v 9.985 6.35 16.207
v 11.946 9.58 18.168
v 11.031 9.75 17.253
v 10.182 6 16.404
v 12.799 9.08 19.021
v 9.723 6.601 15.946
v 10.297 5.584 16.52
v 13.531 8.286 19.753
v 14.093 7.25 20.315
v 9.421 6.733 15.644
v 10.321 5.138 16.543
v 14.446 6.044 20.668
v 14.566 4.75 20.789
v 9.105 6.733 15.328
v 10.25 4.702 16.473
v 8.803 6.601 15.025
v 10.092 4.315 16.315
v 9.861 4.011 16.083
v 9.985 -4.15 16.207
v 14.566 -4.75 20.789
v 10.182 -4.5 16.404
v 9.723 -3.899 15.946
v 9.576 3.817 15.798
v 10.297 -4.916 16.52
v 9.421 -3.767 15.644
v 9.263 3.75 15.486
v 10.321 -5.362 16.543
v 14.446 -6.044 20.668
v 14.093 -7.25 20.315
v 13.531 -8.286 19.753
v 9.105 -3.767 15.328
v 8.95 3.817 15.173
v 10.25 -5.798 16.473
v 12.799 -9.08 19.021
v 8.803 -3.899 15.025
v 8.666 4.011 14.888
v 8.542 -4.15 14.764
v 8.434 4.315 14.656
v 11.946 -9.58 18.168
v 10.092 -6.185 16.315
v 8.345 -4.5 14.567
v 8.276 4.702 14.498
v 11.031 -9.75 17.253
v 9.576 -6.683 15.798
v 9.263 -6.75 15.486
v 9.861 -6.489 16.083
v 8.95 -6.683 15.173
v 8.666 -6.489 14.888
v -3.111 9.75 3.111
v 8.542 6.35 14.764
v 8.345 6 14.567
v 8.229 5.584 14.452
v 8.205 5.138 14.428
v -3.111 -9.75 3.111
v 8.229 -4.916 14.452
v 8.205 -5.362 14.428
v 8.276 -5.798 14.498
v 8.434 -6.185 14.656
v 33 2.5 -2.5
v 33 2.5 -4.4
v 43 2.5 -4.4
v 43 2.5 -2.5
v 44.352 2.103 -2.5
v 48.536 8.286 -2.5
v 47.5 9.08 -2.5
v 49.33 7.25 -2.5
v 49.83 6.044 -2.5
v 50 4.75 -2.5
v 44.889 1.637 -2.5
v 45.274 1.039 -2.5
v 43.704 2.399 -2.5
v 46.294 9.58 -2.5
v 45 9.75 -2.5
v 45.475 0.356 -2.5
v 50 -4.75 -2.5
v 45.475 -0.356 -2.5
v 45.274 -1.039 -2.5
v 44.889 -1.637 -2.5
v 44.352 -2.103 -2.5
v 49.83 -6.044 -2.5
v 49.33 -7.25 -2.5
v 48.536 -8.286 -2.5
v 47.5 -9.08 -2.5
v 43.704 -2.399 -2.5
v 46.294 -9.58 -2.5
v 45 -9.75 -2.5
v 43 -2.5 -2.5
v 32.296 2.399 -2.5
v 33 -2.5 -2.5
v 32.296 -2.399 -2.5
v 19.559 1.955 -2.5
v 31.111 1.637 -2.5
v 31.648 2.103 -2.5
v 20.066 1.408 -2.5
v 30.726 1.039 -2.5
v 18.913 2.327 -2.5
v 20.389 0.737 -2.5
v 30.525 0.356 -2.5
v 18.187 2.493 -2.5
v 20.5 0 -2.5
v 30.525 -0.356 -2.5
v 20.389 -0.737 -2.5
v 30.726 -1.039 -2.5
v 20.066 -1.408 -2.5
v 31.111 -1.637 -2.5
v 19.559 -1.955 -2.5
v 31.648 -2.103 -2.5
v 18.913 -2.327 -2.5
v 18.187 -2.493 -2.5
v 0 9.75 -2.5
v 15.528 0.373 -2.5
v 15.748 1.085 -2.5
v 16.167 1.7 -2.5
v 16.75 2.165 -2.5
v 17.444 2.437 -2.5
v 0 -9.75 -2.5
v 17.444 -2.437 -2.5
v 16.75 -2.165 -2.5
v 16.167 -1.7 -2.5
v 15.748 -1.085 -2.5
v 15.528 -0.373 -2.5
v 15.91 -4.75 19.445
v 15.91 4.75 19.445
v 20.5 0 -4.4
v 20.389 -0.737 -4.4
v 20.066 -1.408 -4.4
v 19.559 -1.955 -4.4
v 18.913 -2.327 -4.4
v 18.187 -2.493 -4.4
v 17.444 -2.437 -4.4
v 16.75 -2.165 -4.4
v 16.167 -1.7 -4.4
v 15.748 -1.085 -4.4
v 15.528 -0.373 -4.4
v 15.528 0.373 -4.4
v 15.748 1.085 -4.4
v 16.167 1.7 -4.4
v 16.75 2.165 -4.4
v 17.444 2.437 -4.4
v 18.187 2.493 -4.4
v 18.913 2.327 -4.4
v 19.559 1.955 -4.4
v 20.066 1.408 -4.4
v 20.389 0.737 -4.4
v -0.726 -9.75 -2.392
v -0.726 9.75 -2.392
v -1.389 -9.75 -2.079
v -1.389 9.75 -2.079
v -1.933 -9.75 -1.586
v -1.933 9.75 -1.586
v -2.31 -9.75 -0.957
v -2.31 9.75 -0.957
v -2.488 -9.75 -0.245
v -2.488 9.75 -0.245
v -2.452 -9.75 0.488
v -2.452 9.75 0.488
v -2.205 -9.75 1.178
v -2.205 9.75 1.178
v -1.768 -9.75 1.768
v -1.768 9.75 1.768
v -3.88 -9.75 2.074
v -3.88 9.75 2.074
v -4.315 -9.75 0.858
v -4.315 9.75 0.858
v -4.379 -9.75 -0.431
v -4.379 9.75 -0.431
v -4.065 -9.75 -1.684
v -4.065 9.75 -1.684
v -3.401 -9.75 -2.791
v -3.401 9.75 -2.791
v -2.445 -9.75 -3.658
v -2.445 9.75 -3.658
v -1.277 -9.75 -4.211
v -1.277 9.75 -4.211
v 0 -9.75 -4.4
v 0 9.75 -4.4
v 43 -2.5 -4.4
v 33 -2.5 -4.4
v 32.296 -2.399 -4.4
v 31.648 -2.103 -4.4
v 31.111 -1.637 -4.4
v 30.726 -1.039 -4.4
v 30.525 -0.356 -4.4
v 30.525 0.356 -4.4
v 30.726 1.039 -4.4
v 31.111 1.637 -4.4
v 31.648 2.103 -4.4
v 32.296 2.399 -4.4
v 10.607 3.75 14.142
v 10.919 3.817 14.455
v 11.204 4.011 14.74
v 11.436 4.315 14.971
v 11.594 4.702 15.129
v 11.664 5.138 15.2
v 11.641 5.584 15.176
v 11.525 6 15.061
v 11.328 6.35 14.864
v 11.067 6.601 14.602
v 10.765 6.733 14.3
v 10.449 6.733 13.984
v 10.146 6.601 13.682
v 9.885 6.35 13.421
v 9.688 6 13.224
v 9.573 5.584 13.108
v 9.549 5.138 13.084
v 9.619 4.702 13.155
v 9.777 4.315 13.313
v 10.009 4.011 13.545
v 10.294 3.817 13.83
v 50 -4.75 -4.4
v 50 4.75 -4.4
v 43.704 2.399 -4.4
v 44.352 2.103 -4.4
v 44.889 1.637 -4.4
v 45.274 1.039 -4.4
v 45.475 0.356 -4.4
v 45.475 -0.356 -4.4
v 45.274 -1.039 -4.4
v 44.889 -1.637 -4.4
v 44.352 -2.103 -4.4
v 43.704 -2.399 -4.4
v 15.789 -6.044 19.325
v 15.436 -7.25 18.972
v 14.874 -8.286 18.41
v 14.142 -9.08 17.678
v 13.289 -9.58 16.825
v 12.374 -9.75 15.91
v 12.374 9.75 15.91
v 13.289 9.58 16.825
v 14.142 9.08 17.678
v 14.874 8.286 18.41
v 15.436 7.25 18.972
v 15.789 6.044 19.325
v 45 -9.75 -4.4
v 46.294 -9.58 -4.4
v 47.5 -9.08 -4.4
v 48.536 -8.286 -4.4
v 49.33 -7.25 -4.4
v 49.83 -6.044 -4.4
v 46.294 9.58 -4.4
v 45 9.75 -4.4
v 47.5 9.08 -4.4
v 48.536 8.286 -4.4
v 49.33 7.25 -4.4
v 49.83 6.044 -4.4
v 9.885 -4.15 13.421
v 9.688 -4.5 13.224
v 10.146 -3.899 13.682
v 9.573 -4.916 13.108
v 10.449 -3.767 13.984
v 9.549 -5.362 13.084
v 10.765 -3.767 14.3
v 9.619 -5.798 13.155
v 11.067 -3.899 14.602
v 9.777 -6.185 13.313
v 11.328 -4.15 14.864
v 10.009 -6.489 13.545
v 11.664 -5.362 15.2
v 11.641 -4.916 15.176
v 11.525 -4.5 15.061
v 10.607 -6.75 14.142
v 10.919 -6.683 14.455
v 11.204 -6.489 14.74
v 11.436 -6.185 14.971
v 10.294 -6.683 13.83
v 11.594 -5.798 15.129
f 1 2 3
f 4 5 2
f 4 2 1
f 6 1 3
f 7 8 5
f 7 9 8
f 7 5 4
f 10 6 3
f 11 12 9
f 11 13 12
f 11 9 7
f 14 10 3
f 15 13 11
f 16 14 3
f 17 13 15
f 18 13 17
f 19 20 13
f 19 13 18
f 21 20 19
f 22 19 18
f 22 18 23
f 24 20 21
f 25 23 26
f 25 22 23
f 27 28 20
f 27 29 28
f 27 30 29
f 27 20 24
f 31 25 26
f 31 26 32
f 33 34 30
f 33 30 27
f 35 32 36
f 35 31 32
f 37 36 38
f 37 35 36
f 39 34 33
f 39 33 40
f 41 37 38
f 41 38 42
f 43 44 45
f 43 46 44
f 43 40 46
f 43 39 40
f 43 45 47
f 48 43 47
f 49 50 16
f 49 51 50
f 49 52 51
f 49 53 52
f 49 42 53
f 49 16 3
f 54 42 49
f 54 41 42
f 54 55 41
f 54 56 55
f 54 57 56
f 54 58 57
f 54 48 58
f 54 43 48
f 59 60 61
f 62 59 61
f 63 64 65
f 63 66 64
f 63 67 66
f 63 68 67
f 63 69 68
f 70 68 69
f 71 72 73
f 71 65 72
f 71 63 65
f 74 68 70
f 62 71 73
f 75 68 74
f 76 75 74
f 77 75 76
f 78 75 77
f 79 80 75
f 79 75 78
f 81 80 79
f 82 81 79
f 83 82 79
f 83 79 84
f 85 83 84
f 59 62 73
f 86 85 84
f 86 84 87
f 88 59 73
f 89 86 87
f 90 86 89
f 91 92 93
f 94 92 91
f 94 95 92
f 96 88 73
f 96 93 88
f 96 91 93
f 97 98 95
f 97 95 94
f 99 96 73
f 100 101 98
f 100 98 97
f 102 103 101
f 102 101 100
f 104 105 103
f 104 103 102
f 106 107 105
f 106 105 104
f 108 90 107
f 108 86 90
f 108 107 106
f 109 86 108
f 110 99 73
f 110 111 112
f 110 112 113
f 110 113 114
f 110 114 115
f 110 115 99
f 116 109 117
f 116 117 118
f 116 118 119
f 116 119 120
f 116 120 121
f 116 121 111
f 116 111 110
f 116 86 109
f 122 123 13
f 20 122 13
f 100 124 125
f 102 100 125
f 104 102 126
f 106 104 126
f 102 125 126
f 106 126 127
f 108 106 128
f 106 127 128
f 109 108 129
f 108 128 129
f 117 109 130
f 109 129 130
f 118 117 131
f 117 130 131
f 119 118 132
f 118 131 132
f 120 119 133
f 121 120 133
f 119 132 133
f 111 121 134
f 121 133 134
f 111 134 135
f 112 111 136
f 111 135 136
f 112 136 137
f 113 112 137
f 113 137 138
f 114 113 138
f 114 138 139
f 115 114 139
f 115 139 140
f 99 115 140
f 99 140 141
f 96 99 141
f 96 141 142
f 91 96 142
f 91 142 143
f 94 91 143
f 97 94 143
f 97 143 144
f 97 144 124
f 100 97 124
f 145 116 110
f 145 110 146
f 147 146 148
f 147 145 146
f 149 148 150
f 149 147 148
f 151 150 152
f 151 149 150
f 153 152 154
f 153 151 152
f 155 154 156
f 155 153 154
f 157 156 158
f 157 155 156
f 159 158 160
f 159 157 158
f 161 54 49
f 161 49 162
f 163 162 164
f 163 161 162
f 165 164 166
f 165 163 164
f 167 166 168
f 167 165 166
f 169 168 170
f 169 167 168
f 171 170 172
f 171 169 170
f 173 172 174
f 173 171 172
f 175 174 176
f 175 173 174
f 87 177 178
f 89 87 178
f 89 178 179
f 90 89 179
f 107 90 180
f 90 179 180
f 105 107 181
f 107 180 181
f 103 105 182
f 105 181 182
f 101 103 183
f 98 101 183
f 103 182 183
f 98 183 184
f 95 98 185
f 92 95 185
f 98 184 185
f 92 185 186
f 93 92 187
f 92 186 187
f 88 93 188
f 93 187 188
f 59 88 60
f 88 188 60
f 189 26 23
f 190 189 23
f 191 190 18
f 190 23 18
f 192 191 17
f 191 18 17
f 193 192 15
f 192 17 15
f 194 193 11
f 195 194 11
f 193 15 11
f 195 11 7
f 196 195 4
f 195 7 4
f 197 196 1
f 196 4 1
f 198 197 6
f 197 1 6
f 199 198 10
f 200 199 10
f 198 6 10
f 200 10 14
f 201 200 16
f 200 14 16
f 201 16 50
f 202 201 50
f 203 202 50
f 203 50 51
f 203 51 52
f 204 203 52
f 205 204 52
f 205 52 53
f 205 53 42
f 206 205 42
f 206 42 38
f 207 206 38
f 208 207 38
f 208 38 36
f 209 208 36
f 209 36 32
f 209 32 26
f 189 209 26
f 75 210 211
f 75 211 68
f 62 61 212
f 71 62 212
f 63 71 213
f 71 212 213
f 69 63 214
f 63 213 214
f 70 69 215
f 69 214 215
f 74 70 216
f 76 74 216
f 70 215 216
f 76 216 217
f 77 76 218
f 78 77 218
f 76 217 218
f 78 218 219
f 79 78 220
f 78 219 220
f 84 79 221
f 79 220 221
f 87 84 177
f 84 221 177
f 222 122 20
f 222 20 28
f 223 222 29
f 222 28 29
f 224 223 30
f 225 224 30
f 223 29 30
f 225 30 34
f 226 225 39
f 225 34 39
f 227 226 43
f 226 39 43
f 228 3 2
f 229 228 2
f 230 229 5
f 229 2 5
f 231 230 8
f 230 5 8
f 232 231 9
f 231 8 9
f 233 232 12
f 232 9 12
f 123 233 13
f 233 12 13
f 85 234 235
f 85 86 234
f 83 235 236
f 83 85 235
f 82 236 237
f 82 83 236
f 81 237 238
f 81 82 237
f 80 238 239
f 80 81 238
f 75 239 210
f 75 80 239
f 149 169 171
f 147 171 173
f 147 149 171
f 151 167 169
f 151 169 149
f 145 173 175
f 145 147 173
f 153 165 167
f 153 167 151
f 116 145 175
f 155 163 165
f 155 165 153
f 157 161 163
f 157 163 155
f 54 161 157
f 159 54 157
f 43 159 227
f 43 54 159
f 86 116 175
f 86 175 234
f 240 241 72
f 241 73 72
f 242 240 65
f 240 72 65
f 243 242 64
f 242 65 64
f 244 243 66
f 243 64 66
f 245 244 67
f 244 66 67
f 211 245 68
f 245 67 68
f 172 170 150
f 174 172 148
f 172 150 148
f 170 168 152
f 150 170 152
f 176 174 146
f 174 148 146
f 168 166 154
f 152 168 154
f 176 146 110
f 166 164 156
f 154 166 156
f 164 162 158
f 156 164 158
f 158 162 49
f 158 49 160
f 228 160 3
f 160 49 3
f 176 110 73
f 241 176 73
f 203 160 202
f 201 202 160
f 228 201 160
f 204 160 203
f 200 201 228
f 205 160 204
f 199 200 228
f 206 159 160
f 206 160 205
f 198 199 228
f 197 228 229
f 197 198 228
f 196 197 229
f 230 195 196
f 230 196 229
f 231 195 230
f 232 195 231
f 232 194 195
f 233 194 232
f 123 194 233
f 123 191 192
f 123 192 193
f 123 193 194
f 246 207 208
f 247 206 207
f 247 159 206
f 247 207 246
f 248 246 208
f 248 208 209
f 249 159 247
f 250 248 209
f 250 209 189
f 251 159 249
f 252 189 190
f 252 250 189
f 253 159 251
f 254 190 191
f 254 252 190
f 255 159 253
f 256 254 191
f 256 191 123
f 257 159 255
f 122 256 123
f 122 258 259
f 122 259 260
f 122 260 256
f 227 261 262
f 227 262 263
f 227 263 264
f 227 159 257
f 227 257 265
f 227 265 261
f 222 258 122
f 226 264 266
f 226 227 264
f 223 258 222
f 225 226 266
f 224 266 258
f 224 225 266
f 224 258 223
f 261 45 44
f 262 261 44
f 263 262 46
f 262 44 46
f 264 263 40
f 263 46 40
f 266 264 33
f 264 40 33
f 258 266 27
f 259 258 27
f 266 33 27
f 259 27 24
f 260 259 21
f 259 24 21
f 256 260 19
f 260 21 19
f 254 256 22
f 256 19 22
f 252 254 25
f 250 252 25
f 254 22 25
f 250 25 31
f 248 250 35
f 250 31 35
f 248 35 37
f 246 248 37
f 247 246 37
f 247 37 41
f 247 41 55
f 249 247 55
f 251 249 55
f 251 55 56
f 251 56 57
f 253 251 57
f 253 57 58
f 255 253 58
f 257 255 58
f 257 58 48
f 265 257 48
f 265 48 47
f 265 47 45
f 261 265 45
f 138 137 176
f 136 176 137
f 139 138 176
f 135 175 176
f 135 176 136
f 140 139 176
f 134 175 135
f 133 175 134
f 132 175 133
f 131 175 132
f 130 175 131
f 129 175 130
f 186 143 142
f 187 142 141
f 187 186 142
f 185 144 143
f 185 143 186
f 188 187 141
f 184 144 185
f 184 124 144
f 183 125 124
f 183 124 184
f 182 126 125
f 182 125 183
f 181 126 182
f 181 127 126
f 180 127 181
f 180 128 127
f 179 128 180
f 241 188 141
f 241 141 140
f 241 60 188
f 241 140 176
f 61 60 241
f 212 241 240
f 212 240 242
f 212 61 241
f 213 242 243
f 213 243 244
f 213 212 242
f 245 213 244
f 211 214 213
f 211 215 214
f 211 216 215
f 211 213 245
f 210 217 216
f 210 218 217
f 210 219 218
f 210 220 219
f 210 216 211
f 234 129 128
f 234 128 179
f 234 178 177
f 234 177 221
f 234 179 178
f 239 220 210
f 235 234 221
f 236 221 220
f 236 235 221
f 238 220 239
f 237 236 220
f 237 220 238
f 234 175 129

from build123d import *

# Parameters (mm, degrees)
F1_DEPTH = 9.75
F2_R     = 2.5
F3_DEPTH = 2
F4_R     = 1.5
F5_DEPTH = 2
F6_R     = 5


with BuildPart() as f1:
    # F0 (on Front) → F1 (new body, symmetric)
    with BuildSketch(Plane.XZ):
        with BuildLine():
            Line((14.5664, 20.788939), (-3.11127, 3.11127))
            ThreePointArc((-3.11127, 3.11127), (-4.06507, -1.683807), (0, -4.4))
            Line((0, -4.4), (50, -4.4))
            Line((50, -4.4), (50, -2.5))
            Line((50, -2.5), (0, -2.5))
            ThreePointArc((0, -2.5), (-2.309699, -0.956709), (-1.767767, 1.767767))
            Line((-1.767767, 1.767767), (15.909903, 19.445436))
            Line((15.909903, 19.445436), (14.5664, 20.788939))
        make_face()
    extrude(amount=F1_DEPTH, both=True)

    # F2 (on face) → F3 (cut)
    with BuildSketch(Plane(origin=(0, 0, -4.4), x_dir=(1, 0, 0), z_dir=(0, 0, -1))):
        with Locations((18, 0)):
            Circle(F2_R)
        with BuildLine():
            Line((43, 2.5), (33, 2.5))
            ThreePointArc((33, 2.5), (30.5, 0), (33, -2.5))
            Line((33, -2.5), (43, -2.5))
            ThreePointArc((43, -2.5), (45.5, 0), (43, 2.5))
        make_face()
    extrude(amount=-F3_DEPTH, mode=Mode.SUBTRACT)

    # F4 (on face) → F5 (cut)
    with BuildSketch(Plane(origin=(-3.11127, 0, 3.11127), x_dir=(0, -1, 0), z_dir=(-0.707107, 0, 0.707107))):
        with Locations((-5.25, 17.5)):
            Circle(F4_R)
        with Locations((5.25, 17.5)):
            Circle(F4_R)
    extrude(amount=-F5_DEPTH, mode=Mode.SUBTRACT)

    # F6
    f6_edges = [f1.edges().sort_by_distance(p)[0] for p in [
        (15.238151, -9.75, 20.117188),
        (15.238151, 9.75, 20.117188),
        (50, 9.75, -3.45),
        (50, -9.75, -3.45),
    ]]
    fillet(f6_edges, radius=F6_R)


solid = f1.part
